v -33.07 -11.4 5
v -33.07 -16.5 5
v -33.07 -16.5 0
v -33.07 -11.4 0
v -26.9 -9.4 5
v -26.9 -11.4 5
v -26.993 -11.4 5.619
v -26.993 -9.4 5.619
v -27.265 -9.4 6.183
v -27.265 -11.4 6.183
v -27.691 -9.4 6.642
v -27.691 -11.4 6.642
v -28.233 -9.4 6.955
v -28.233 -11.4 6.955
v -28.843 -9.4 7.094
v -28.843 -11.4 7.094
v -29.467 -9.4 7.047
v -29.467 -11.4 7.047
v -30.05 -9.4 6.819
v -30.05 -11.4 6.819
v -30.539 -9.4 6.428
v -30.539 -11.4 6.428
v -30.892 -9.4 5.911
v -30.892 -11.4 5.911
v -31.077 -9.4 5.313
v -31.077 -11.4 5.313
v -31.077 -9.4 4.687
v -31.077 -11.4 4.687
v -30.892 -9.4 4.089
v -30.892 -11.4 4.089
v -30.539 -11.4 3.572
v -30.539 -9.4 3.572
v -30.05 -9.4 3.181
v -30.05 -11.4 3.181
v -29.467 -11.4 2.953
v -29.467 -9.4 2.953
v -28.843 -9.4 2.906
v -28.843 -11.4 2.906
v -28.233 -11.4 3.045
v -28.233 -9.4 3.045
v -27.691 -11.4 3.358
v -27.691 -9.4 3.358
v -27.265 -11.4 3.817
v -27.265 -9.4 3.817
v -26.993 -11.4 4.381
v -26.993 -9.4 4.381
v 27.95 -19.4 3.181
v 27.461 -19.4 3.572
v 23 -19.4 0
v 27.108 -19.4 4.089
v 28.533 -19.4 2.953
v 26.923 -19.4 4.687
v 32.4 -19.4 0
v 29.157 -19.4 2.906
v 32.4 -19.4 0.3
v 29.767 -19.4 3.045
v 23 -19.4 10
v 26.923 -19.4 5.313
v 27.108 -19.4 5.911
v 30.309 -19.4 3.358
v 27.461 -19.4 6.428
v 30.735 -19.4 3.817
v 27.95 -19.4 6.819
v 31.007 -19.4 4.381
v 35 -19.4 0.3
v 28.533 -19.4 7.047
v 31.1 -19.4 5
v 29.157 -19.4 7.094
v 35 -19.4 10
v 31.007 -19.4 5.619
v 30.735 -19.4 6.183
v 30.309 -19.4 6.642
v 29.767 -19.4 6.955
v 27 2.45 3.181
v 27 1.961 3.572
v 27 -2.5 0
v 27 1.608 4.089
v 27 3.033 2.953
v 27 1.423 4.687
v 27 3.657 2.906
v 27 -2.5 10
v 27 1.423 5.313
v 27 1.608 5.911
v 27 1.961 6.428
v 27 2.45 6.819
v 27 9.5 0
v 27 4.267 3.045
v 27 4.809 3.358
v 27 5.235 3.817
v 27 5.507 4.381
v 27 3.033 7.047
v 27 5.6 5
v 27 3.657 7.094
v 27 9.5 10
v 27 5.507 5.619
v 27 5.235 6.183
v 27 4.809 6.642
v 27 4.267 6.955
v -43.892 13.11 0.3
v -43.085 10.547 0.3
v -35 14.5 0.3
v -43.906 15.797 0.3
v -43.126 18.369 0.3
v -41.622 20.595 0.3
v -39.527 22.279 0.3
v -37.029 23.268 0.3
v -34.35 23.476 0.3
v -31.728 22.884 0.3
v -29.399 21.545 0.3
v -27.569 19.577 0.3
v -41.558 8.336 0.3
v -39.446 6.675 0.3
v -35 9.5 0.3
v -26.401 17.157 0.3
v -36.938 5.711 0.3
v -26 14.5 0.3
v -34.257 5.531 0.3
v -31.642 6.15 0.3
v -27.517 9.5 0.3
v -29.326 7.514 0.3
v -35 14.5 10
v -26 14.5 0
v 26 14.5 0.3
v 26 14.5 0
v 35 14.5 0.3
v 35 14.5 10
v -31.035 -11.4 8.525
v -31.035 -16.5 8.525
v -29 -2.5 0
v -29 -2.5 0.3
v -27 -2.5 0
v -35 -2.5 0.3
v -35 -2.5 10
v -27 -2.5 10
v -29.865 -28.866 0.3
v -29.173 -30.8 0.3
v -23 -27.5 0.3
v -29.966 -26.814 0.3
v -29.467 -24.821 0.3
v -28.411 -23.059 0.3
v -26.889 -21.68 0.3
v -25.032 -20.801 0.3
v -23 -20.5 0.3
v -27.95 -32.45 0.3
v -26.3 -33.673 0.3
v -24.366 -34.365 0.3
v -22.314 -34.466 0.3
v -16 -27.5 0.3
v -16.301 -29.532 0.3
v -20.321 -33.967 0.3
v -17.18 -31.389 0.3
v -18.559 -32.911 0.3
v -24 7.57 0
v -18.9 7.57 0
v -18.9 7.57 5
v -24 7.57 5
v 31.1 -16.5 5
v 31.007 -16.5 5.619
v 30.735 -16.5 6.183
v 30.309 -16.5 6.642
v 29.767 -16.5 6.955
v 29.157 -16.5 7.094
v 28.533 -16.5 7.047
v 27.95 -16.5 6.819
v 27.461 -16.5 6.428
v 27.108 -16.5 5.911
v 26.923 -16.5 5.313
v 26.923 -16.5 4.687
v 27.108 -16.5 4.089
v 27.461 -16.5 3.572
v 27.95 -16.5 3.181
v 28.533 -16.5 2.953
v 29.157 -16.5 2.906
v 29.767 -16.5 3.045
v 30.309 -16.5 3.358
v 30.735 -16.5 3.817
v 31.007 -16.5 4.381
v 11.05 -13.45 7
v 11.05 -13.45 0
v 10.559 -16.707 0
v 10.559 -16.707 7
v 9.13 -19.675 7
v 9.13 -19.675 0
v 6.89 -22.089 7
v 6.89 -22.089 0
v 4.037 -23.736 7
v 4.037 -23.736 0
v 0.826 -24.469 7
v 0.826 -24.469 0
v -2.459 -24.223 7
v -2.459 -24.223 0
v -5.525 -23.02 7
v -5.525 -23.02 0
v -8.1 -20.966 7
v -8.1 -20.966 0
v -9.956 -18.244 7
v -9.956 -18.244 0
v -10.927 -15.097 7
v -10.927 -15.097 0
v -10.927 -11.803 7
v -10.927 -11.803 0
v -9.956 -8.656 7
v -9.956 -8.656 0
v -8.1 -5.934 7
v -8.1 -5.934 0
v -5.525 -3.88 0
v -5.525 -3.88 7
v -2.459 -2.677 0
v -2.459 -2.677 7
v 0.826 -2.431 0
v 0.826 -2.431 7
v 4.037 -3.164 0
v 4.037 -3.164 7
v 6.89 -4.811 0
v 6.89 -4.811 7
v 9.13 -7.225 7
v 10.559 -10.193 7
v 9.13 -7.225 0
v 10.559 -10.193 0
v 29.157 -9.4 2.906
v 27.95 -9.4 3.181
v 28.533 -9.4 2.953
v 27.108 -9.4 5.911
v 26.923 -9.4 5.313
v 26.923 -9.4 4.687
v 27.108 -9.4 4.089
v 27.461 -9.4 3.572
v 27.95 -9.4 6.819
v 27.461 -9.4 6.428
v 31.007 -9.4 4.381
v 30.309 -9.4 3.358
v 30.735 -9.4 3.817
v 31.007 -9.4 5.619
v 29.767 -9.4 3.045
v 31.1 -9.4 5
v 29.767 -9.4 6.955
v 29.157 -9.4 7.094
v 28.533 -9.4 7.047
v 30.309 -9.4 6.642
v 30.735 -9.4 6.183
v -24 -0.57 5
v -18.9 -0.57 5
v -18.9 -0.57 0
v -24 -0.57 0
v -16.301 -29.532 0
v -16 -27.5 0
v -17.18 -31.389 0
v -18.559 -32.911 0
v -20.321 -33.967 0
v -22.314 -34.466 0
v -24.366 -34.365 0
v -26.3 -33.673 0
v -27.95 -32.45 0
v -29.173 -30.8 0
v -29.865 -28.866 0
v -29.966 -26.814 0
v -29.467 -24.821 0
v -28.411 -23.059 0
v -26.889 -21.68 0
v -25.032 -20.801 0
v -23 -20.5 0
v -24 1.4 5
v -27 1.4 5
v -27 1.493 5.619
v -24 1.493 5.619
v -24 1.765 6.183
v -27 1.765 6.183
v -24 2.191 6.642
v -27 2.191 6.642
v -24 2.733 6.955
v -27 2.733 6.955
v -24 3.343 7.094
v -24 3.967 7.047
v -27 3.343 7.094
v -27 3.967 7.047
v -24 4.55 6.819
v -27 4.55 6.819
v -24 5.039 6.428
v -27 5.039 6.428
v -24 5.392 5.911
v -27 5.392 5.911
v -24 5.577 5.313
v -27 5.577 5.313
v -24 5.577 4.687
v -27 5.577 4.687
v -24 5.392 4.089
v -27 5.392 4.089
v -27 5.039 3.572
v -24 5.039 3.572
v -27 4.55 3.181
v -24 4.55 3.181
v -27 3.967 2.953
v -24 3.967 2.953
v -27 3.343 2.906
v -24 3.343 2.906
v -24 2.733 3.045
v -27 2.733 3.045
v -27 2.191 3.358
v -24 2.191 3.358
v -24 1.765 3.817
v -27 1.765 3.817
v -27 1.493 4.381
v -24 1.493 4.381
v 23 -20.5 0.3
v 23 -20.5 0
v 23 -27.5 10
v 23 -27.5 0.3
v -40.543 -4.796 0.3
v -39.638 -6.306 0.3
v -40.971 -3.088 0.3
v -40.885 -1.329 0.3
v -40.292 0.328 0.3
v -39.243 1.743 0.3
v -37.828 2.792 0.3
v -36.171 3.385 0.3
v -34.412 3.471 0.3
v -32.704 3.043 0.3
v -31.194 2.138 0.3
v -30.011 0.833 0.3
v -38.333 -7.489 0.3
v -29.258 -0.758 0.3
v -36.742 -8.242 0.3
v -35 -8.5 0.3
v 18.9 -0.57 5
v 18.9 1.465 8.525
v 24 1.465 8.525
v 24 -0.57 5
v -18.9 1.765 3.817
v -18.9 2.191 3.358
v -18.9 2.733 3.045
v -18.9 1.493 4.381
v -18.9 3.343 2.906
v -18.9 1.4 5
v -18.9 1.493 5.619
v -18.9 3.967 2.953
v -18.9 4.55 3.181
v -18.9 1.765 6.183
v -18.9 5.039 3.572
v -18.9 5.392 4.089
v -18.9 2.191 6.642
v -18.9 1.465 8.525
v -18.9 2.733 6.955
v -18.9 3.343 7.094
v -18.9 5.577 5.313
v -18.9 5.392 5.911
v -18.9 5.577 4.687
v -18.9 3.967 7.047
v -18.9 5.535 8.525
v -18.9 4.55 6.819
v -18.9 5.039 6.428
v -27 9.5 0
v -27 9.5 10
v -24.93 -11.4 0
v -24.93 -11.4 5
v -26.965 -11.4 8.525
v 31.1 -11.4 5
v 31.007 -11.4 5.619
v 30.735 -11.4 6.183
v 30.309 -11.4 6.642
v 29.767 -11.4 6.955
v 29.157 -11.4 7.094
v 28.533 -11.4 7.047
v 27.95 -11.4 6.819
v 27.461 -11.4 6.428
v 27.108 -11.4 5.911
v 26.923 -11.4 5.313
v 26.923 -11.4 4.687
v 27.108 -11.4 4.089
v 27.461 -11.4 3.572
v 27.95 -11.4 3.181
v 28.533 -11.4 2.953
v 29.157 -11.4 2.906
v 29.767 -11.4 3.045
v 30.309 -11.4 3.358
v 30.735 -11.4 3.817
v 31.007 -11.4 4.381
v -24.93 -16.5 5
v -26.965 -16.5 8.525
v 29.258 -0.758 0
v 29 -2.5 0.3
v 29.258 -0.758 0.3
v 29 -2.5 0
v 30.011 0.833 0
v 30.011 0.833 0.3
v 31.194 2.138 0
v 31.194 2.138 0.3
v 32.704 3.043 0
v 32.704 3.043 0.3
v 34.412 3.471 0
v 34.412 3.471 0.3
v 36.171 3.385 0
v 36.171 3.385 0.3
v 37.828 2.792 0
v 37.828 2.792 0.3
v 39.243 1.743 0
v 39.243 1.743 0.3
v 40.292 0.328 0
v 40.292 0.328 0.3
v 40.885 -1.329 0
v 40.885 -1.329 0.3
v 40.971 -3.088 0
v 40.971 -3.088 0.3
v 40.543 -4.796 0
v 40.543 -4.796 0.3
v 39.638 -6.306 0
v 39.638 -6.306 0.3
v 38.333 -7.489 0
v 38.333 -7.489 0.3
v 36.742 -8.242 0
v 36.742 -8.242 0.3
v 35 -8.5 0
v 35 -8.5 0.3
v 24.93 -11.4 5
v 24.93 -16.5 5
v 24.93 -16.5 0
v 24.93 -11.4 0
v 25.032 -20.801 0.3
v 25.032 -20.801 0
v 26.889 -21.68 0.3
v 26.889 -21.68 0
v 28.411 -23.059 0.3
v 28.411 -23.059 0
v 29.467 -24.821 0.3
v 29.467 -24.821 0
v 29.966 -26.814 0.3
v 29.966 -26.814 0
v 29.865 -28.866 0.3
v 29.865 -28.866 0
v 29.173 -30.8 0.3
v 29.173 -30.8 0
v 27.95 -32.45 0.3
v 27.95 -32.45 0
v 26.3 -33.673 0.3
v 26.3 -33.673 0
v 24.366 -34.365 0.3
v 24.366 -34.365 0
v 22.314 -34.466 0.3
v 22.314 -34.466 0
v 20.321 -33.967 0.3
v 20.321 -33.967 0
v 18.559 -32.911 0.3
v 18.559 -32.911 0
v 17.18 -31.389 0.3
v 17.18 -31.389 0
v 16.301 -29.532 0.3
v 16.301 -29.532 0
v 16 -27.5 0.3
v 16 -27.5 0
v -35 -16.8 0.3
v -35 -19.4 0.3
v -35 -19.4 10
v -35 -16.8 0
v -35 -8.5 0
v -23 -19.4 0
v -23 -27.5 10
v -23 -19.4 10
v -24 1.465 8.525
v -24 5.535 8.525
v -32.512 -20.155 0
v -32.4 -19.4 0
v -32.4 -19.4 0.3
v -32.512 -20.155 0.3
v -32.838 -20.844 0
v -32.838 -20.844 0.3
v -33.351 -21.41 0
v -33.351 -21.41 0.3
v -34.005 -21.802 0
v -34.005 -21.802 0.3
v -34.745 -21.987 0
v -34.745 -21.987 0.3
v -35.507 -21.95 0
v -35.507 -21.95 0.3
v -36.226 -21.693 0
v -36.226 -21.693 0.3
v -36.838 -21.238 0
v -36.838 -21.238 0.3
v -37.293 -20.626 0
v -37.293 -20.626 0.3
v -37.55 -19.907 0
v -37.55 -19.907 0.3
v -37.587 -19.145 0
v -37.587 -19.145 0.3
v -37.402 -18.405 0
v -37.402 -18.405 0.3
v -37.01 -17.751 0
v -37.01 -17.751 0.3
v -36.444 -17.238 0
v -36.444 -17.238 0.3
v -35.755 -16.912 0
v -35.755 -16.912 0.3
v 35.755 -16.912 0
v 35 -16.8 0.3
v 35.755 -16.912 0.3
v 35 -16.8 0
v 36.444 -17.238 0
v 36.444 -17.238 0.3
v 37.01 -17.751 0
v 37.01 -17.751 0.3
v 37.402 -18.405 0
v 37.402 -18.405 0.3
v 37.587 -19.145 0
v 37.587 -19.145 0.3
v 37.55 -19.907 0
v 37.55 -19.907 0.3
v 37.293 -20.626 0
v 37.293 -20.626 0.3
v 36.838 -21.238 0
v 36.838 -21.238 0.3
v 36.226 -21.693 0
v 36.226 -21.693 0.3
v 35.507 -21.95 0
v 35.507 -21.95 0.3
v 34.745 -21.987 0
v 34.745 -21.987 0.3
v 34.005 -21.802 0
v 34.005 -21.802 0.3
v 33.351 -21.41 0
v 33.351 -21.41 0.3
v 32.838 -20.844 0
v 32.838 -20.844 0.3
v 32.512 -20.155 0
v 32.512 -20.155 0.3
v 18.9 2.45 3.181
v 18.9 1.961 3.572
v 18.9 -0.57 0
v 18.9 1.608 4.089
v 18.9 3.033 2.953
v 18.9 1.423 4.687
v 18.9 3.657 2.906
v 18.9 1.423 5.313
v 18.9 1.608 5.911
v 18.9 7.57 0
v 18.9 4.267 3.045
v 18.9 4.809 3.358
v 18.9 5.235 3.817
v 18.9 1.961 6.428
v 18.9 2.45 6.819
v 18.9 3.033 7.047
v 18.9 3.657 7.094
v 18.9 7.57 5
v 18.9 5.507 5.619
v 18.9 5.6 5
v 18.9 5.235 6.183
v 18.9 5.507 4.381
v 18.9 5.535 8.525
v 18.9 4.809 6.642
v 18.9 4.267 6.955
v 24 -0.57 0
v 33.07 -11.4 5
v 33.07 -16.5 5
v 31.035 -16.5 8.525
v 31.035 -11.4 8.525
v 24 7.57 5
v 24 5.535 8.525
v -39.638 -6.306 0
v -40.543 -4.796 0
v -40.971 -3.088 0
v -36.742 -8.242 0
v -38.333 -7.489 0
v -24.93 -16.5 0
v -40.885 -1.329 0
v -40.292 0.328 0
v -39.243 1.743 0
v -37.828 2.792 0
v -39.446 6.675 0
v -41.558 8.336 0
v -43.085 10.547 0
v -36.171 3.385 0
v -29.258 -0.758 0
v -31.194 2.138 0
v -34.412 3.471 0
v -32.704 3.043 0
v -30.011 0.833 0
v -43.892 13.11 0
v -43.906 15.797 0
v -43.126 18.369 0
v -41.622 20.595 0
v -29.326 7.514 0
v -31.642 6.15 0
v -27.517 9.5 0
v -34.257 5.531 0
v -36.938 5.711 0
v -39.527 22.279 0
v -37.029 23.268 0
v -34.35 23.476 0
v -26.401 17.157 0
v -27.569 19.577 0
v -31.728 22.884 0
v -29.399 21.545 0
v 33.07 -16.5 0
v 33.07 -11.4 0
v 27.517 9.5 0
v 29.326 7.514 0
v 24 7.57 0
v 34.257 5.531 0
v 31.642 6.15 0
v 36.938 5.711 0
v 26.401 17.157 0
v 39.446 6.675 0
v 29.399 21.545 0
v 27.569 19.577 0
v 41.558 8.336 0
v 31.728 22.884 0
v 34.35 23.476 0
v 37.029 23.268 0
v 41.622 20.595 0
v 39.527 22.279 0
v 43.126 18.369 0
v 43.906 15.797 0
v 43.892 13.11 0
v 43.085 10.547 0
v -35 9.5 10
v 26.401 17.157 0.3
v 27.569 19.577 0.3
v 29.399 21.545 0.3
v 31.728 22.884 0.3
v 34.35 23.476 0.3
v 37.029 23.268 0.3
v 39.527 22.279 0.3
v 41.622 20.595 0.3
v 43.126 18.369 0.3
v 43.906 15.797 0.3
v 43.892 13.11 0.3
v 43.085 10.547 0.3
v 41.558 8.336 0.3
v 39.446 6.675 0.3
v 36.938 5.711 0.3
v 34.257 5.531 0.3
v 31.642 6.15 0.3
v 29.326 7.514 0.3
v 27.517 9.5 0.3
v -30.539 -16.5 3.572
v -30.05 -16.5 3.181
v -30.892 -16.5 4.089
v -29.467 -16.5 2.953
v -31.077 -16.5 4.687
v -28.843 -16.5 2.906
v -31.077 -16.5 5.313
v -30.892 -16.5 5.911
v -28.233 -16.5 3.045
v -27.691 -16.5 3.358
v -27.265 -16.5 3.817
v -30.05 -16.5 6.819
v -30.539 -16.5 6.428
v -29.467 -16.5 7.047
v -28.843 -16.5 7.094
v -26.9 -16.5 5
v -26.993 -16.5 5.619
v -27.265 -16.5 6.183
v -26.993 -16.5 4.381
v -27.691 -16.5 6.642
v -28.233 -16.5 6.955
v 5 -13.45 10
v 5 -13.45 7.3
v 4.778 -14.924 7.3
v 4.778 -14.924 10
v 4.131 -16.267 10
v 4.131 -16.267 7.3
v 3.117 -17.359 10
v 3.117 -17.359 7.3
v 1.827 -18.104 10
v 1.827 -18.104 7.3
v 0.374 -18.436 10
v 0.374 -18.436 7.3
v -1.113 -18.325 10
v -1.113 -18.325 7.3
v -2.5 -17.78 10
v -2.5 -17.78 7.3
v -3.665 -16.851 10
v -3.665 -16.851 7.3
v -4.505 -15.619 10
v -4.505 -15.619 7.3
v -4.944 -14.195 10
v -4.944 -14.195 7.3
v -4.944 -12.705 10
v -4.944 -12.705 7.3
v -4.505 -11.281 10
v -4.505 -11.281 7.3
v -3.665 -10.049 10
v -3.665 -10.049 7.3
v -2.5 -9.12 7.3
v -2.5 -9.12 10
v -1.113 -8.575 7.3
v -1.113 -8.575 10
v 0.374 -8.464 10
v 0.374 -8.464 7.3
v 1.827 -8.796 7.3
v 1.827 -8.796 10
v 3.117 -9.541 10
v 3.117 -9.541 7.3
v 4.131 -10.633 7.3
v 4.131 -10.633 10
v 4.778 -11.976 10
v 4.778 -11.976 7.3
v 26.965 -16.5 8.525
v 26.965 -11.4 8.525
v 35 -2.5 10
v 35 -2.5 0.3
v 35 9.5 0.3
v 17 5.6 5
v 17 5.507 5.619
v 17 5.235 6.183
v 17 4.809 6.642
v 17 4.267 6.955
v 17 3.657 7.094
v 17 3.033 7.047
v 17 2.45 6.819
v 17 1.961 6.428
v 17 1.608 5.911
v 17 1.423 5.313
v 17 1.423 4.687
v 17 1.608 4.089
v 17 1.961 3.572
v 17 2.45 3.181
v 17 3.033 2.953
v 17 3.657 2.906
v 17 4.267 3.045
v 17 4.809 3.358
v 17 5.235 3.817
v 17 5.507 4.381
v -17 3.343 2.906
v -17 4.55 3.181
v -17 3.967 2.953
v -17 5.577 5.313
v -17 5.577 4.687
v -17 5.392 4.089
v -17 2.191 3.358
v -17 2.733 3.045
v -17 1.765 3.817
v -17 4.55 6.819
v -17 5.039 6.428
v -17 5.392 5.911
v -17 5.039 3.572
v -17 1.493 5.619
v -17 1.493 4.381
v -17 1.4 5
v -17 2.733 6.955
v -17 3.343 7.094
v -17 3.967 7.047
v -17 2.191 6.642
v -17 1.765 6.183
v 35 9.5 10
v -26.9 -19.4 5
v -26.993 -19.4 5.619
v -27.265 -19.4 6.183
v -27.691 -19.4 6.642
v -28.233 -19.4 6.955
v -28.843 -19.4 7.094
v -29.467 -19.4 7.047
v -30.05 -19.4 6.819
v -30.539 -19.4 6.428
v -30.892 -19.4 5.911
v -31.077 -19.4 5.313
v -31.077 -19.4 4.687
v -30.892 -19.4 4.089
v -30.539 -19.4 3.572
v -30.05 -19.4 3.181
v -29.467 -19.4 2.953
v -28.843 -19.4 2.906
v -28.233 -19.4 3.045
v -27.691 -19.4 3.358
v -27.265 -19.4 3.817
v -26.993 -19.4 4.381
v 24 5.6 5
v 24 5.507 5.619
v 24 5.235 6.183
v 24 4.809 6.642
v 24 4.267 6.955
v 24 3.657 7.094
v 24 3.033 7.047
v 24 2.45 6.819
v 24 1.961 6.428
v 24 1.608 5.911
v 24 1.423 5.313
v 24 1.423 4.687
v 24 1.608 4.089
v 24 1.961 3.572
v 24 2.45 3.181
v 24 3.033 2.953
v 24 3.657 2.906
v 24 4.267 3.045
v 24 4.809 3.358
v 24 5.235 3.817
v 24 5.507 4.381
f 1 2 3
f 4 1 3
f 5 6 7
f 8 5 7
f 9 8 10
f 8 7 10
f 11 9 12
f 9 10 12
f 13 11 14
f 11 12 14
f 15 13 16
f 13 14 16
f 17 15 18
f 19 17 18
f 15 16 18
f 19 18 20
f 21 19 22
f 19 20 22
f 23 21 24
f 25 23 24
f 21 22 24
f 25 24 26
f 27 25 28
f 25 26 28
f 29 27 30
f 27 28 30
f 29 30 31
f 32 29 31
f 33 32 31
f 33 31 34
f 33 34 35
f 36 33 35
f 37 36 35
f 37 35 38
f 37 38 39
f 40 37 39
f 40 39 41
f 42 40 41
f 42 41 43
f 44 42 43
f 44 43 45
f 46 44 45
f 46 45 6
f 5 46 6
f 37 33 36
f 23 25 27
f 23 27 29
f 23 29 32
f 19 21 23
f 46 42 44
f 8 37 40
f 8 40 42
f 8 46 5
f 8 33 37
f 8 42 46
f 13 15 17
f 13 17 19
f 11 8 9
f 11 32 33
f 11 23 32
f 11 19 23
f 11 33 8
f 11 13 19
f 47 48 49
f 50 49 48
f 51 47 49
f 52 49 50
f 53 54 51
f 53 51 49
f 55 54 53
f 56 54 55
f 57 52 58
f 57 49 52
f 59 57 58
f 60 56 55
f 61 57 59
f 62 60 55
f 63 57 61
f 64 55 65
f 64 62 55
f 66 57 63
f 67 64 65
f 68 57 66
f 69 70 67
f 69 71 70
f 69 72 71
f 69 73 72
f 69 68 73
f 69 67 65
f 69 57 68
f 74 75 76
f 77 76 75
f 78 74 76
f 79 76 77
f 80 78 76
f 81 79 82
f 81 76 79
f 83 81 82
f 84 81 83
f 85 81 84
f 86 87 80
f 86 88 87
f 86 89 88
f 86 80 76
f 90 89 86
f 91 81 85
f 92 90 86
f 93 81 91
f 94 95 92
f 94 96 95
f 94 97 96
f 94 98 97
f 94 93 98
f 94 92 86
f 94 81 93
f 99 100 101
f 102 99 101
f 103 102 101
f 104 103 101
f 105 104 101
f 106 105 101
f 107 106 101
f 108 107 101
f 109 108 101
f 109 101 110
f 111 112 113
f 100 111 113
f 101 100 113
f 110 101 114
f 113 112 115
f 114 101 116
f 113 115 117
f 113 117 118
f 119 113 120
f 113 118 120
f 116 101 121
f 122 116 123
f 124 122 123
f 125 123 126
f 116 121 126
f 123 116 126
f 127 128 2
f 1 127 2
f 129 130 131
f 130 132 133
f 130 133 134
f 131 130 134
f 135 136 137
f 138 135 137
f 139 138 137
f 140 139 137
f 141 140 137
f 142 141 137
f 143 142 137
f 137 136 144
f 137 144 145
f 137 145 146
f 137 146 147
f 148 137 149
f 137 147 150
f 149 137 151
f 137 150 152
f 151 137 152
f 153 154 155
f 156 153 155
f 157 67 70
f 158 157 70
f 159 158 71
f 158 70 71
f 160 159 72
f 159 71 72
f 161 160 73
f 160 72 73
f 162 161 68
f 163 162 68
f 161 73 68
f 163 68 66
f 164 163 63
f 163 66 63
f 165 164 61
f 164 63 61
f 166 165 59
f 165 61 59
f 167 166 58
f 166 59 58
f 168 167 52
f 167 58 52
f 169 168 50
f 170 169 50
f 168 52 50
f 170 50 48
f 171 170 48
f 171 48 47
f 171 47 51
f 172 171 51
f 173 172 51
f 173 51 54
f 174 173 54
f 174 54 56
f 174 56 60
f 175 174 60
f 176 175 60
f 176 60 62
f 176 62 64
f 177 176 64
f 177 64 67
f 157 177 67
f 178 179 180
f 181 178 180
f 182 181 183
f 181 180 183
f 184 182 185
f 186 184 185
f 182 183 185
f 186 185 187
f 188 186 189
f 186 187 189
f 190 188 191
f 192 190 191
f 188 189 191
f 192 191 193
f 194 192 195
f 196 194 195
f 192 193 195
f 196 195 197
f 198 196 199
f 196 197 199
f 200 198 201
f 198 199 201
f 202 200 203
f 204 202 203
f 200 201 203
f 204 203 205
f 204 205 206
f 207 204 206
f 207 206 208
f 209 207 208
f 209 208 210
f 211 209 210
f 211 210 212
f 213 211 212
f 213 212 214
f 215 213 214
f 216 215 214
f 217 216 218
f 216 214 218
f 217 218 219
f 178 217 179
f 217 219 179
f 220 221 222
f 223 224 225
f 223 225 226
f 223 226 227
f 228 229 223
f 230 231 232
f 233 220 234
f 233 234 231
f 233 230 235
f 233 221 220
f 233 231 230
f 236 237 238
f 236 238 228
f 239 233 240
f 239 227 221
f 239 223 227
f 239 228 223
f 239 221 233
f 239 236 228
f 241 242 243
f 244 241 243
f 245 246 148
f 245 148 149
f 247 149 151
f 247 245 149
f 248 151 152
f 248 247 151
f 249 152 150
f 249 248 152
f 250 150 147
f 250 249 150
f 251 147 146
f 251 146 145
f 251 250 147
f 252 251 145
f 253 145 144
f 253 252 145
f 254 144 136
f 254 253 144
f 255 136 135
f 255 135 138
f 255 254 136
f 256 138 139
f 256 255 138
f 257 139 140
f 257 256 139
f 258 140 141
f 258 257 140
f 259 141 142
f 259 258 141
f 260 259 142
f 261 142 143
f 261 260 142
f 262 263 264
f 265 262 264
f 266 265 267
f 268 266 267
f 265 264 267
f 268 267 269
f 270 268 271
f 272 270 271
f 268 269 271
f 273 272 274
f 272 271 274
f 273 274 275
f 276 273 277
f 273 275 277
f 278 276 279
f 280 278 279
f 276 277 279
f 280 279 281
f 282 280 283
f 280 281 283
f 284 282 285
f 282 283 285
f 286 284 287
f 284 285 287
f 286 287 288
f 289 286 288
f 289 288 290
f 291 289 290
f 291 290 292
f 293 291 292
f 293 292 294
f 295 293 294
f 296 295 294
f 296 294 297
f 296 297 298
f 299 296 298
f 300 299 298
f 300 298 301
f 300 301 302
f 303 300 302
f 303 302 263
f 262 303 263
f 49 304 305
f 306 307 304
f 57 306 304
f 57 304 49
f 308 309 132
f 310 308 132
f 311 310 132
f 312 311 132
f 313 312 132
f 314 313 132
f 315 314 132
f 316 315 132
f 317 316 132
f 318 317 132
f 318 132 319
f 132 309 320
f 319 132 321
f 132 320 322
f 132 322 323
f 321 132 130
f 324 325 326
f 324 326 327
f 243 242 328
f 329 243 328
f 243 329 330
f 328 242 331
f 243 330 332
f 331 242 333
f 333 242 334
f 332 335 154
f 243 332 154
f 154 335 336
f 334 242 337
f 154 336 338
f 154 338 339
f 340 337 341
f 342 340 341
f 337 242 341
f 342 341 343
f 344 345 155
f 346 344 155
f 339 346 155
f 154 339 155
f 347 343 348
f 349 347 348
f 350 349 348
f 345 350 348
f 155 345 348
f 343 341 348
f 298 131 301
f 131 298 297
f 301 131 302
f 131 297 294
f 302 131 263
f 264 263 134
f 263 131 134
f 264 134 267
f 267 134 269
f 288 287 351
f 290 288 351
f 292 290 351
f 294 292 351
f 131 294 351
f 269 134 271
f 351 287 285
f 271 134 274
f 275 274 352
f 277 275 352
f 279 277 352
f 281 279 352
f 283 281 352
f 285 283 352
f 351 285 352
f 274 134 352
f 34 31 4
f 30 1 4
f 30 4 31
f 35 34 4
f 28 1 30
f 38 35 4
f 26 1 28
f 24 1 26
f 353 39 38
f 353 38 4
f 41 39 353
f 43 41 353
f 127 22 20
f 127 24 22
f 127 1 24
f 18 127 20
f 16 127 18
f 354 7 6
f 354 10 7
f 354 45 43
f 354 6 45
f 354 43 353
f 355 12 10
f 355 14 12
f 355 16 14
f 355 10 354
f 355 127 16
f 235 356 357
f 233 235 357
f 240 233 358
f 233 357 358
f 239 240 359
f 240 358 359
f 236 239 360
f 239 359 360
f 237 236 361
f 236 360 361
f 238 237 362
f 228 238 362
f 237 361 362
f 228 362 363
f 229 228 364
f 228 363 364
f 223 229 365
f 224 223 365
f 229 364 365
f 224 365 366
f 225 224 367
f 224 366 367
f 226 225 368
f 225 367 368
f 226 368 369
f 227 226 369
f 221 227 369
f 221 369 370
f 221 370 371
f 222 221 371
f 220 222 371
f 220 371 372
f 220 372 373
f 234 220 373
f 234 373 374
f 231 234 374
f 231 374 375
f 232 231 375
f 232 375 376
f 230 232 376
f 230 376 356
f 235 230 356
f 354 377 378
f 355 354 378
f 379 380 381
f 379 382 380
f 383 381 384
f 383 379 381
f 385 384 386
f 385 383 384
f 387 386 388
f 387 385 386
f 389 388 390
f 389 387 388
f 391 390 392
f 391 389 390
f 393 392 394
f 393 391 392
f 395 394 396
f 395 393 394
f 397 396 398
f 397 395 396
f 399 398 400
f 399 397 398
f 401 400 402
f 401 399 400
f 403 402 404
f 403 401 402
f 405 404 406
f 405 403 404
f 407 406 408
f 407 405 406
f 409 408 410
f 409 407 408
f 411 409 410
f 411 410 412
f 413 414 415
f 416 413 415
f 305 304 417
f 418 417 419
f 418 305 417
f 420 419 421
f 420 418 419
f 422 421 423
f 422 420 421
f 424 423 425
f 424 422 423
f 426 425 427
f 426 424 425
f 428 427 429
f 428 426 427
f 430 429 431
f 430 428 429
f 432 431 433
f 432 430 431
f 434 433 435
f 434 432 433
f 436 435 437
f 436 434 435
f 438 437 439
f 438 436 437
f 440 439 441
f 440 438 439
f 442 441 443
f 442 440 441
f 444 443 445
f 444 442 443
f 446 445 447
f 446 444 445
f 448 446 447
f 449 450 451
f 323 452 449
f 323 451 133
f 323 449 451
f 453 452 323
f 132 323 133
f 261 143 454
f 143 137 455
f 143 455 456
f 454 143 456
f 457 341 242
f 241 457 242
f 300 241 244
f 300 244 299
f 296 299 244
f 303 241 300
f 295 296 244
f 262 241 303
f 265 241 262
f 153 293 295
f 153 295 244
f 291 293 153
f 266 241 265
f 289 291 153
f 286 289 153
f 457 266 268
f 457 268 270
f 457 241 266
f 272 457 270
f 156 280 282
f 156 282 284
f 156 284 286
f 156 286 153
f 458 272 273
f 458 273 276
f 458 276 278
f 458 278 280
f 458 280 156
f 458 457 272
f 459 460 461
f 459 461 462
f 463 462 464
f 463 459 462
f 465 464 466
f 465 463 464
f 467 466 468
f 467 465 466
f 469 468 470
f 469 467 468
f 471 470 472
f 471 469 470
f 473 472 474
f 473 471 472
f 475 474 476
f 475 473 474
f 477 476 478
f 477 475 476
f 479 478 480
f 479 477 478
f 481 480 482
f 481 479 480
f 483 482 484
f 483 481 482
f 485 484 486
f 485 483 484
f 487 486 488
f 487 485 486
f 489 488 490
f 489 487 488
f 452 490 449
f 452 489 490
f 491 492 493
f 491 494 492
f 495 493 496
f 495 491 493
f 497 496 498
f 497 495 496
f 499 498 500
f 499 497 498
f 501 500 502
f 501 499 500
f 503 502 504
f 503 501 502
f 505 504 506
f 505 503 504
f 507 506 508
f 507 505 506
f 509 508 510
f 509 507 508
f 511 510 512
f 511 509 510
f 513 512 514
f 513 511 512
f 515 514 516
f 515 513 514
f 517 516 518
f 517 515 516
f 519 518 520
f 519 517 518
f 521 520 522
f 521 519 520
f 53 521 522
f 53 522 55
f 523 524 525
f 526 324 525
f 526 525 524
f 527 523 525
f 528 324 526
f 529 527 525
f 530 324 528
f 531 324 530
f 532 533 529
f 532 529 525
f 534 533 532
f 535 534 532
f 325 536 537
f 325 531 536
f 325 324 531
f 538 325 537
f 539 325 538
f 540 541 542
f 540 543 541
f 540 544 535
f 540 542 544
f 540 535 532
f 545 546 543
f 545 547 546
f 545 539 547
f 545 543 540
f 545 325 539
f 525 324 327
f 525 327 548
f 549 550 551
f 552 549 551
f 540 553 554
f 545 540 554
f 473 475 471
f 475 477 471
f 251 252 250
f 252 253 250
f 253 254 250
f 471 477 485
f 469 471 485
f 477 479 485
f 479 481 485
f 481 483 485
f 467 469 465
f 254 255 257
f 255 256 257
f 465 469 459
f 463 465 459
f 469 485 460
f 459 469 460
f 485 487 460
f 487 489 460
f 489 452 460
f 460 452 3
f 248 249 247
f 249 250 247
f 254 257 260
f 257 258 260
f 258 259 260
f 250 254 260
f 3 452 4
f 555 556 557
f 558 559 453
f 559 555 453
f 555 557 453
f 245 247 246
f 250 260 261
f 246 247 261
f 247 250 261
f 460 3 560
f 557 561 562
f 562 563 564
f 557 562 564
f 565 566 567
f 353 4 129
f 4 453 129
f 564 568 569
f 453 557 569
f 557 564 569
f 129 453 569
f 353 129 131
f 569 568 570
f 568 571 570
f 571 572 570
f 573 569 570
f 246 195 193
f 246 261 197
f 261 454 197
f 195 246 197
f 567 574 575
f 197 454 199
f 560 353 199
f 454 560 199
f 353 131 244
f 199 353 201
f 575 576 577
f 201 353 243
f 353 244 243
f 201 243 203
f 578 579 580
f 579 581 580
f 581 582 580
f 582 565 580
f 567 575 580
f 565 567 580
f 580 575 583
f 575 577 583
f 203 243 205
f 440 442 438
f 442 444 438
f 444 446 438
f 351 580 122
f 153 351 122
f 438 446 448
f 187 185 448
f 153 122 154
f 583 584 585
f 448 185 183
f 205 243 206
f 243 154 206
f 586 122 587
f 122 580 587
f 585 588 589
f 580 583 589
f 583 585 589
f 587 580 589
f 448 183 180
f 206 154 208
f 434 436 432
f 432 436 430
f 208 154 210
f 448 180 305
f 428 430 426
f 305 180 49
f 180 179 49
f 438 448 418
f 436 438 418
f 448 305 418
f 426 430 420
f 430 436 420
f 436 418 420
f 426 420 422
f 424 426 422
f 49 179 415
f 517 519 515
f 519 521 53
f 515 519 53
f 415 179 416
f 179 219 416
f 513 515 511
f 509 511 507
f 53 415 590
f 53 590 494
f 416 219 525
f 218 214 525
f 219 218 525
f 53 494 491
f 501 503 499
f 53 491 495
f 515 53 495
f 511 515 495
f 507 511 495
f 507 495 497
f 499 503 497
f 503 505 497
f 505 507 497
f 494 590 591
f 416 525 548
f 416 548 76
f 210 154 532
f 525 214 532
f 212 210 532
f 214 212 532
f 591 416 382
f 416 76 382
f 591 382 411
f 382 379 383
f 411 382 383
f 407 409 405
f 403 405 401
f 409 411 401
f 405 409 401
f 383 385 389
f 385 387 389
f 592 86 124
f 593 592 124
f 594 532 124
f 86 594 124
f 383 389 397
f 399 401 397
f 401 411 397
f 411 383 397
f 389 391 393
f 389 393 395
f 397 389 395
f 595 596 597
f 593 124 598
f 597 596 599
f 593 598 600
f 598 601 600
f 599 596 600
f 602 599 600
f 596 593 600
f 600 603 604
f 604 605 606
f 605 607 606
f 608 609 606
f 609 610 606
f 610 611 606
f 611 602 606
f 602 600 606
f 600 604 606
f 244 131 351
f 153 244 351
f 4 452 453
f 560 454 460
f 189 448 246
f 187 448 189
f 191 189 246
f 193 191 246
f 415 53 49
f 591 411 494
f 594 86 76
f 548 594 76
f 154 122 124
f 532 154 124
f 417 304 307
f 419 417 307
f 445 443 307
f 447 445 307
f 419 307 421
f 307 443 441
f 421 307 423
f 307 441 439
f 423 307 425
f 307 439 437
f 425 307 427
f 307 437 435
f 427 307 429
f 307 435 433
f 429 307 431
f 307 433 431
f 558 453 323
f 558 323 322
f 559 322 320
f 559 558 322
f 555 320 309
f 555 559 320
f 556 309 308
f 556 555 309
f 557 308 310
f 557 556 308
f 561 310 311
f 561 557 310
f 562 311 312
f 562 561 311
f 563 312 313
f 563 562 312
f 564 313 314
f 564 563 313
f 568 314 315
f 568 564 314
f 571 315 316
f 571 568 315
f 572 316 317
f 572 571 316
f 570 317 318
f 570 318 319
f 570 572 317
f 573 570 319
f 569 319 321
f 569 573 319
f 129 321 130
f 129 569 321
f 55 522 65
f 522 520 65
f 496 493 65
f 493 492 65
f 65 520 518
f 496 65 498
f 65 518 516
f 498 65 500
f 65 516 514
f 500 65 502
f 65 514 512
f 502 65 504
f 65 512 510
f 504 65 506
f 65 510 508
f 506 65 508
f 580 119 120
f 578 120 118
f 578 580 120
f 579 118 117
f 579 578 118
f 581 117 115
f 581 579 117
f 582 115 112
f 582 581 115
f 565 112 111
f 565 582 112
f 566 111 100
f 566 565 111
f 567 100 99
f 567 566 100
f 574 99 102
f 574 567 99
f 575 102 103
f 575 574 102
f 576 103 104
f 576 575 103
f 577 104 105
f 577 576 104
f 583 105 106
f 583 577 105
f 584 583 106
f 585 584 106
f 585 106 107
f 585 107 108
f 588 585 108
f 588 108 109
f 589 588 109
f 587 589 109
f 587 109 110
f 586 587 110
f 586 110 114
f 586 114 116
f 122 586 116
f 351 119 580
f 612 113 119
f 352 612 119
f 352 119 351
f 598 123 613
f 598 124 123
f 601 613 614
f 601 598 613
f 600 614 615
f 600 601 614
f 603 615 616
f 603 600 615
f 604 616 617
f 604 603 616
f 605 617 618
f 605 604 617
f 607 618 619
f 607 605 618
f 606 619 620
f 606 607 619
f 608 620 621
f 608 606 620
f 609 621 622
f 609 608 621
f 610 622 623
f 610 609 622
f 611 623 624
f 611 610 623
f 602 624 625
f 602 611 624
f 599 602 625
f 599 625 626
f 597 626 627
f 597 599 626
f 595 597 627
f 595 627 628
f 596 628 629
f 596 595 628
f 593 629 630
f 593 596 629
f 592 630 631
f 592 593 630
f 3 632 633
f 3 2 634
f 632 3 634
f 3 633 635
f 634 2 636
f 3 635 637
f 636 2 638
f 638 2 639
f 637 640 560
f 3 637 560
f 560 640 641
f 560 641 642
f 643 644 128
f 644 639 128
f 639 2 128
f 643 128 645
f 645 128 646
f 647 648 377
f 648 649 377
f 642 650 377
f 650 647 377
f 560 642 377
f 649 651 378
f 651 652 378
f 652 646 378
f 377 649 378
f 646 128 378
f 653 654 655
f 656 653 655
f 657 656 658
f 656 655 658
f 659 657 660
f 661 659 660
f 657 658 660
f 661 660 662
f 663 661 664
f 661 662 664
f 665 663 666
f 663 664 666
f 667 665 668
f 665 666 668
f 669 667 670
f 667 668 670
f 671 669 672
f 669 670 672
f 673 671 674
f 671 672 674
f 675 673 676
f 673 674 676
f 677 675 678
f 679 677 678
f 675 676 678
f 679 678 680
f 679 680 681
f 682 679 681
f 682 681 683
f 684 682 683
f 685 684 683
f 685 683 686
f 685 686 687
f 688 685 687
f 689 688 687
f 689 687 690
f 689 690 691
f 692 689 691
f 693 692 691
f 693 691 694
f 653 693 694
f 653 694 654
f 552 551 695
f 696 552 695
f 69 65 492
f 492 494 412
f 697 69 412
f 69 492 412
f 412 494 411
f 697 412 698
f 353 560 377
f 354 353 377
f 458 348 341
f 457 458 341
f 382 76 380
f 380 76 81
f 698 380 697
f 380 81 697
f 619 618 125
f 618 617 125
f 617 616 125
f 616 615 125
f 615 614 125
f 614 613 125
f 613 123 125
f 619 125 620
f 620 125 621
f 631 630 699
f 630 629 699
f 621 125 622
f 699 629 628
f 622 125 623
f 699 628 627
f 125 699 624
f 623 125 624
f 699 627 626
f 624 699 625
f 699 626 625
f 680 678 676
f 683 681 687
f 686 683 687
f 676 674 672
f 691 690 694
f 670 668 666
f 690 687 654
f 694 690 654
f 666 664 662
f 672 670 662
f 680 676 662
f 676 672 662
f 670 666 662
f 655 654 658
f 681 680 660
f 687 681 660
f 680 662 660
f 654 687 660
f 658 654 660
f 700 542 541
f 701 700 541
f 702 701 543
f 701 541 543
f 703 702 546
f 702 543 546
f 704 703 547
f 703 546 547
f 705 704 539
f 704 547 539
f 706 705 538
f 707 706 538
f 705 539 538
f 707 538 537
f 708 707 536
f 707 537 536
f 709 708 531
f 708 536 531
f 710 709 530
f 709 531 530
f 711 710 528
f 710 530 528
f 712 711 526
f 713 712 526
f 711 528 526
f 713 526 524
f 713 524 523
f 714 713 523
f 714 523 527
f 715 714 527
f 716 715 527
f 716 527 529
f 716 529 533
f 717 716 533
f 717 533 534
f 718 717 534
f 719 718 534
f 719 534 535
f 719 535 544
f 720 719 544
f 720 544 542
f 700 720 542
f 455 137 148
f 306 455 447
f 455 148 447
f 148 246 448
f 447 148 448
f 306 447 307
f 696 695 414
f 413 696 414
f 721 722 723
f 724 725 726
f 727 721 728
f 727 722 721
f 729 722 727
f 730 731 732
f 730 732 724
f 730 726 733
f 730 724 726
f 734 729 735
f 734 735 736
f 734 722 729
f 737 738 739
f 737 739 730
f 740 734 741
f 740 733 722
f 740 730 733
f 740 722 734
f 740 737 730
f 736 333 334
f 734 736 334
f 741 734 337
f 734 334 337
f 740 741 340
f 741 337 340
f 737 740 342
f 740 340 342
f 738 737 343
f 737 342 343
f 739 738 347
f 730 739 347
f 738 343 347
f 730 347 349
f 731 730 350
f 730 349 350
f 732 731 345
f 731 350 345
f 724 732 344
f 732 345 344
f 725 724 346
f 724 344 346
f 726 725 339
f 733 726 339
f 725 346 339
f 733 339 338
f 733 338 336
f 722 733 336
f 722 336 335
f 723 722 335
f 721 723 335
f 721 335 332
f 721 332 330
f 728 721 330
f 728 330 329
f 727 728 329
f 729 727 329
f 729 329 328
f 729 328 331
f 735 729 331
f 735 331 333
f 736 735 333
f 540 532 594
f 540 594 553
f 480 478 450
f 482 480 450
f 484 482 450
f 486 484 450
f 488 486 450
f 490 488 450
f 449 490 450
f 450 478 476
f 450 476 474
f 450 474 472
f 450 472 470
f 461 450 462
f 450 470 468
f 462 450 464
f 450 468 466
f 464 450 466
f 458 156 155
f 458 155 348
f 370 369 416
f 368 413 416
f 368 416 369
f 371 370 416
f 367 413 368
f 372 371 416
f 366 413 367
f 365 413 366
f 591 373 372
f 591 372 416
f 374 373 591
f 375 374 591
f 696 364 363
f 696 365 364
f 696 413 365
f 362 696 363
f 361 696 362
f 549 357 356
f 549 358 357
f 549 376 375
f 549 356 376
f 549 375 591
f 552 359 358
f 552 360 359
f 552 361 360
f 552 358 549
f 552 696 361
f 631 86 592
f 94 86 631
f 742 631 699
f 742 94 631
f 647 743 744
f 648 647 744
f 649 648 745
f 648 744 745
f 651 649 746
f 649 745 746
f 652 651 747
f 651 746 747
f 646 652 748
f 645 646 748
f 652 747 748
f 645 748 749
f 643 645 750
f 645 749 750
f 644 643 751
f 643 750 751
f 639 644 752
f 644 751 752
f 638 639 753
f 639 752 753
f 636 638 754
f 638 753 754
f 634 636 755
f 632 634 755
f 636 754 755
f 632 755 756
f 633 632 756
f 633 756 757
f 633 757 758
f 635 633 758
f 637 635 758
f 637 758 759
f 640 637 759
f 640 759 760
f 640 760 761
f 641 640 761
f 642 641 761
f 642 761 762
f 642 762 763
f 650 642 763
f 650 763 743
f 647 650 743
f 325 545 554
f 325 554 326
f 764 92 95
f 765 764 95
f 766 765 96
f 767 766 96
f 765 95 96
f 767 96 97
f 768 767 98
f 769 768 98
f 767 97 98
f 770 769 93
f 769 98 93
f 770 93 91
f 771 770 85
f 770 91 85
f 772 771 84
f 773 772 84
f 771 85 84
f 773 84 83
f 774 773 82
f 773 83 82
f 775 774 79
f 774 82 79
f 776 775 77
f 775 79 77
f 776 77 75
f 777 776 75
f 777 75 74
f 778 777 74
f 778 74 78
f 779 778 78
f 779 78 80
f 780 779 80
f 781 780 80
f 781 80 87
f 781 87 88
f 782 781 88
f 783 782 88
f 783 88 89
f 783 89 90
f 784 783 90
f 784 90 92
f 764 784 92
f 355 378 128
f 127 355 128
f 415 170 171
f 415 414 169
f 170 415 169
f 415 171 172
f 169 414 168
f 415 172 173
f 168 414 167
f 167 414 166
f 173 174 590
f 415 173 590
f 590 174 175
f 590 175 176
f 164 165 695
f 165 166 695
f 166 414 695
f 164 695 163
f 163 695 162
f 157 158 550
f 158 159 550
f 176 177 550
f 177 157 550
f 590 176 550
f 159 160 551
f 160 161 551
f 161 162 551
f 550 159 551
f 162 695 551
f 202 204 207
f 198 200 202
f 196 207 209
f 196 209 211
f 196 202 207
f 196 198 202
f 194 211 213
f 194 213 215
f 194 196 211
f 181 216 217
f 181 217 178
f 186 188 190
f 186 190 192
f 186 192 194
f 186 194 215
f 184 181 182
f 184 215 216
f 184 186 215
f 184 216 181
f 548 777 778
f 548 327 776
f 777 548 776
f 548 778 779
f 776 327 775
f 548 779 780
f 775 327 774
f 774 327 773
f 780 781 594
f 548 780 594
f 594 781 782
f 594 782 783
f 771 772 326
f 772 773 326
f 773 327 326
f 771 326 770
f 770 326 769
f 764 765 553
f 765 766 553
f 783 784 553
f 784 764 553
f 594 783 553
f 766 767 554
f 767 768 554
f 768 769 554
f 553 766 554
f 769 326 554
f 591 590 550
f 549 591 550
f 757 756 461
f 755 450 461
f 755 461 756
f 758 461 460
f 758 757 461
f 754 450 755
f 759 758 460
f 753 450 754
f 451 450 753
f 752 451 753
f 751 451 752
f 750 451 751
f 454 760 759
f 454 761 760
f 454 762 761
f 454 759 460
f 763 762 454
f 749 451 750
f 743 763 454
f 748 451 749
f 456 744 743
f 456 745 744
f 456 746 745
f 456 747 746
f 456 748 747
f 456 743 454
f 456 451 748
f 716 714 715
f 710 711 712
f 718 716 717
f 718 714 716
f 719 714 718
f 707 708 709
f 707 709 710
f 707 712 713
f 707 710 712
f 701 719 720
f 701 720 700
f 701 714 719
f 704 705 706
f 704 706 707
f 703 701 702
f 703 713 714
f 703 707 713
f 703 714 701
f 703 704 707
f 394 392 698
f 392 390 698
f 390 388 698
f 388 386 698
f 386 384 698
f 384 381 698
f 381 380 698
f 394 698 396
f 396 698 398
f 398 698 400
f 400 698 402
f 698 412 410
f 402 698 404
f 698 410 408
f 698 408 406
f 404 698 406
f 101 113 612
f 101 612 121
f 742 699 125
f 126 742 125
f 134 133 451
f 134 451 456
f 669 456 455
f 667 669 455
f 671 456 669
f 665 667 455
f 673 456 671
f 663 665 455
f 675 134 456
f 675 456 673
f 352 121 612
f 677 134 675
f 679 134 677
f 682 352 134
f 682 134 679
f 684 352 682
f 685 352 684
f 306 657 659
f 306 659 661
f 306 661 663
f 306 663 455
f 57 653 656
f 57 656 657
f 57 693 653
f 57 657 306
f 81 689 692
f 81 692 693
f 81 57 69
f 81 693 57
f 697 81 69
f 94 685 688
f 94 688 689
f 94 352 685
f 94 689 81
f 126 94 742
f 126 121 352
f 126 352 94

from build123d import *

# Parameters (mm, degrees)
PAD002_DEPTH    = 5.1
PAD003_DEPTH    = 5.1
PAD001_DEPTH    = 5.1
SKETCH_W        = 70
SKETCH_H        = 55
PAD_DEPTH       = 10
SKETCH001_R     = 11.05
POCKET_DEPTH    = 7
SKETCH002_R     = 5
POCKET001_DEPTH = 3.001
SKETCH003_W     = 12
SKETCH003_H     = 8.1
SKETCH003_W_2   = 8
SKETCH003_H_2   = 12
POCKET002_DEPTH = 10.001
SKETCH004_R     = 2.1
POCKET003_DEPTH = 10
SKETCH005_R     = 2.1
POCKET004_DEPTH = 10
SKETCH006_R     = 2.1
POCKET005_DEPTH = 10
SKETCH010_W     = 70
SKETCH010_H     = 13
POCKET006_DEPTH = 10.001
SKETCH011_R     = 9
SKETCH011_R_2   = 6
SKETCH011_R_3   = 7
SKETCH011_R_4   = 2.6
PAD004_DEPTH    = 0.3
SKETCH012_R     = 5
PAD005_DEPTH    = 0.3


with BuildPart() as pad002:
    # Sketch008 → Pad002 (new body)
    with BuildSketch(Plane.YZ.offset(24)):
        Polygon((7.570319, 5), (5.53516, 8.525), (1.46484, 8.525), (-0.570319, 5), (-0.570319, 0), (7.570319, 0), align=None)
    extrude(amount=-PAD002_DEPTH)


with BuildPart() as pad003:
    # Sketch009 → Pad003 (new body)
    with BuildSketch(Plane.XZ.offset(16.5)):
        Polygon((-24.929681, 5), (-26.96484, 8.525), (-31.03516, 8.525), (-33.070319, 5), (-33.070319, 0), (-24.929681, 0), align=None)
        Polygon((33.070319, 5), (31.03516, 8.525), (26.96484, 8.525), (24.929681, 5), (24.929681, 0), (33.070319, 0), align=None)
    extrude(amount=-PAD003_DEPTH)


with BuildPart() as pad001:
    # Sketch007 → Pad001 (new body)
    with BuildSketch(Plane.YZ.offset(-24)):
        Polygon((7.570319, 5), (5.53516, 8.525), (1.46484, 8.525), (-0.570319, 5), (-0.570319, 0), (7.570319, 0), align=None)
    extrude(amount=PAD001_DEPTH)


with BuildPart() as halterung_fr_sspindel_bot_druck:
    # Sketch → Pad (new body)
    with BuildSketch(Plane.XY):
        Rectangle(SKETCH_W, SKETCH_H)
    extrude(amount=PAD_DEPTH)

    # Sketch001 → Pocket (cut)
    with BuildSketch(Plane(origin=(0, 0, 0), x_dir=(1, 0, 0), z_dir=(0, 0, -1))):
        with Locations((0, 13.45)):
            Circle(SKETCH001_R)
    extrude(amount=-POCKET_DEPTH, mode=Mode.SUBTRACT)

    # Sketch002 → Pocket001 (cut, through all)
    with BuildSketch(Plane(origin=(0, 0, 7), x_dir=(1, 0, 0), z_dir=(0, 0, -1))):
        with Locations((0, 13.45)):
            Circle(SKETCH002_R)
    extrude(amount=-POCKET001_DEPTH, mode=Mode.SUBTRACT)

    # Sketch003 → Pocket002 (cut, through all)
    with BuildSketch(Plane.XY.offset(10)):
        with Locations((-29, -23.45)):
            Rectangle(SKETCH003_W, SKETCH003_H)
        with Locations((29, -23.45)):
            Rectangle(SKETCH003_W, SKETCH003_H)
        with Locations((-31, 3.5)):
            Rectangle(SKETCH003_W_2, SKETCH003_H_2)
        with Locations((31, 3.5)):
            Rectangle(SKETCH003_W_2, SKETCH003_H_2)
    extrude(amount=-POCKET002_DEPTH, mode=Mode.SUBTRACT)

    # Sketch004 → Pocket003 (cut)
    with BuildSketch(Plane(origin=(-27, 0, 0), x_dir=(0, -1, 0), z_dir=(-1, 0, 0))):
        with Locations((-3.5, 5)):
            Circle(SKETCH004_R)
    extrude(amount=-POCKET003_DEPTH, mode=Mode.SUBTRACT)

    # Sketch005 → Pocket004 (cut)
    with BuildSketch(Plane.YZ.offset(27)):
        with Locations((3.5, 5)):
            Circle(SKETCH005_R)
    extrude(amount=-POCKET004_DEPTH, mode=Mode.SUBTRACT)

    # Sketch006 → Pocket005 (cut)
    with BuildSketch(Plane.XZ.offset(19.4)):
        with Locations((-29, 5)):
            Circle(SKETCH006_R)
        with Locations((29, 5)):
            Circle(SKETCH006_R)
    extrude(amount=-POCKET005_DEPTH, mode=Mode.SUBTRACT)

    # Cut: cut Pad001
    add(pad001.part, mode=Mode.SUBTRACT)

    # Cut001: cut Pad003
    add(pad003.part, mode=Mode.SUBTRACT)

    # Cut002: cut Pad002
    add(pad002.part, mode=Mode.SUBTRACT)

    # Sketch010 → Pocket006 (cut, through all)
    with BuildSketch(Plane.XY.offset(10)):
        with Locations((0, 21)):
            Rectangle(SKETCH010_W, SKETCH010_H)
    extrude(amount=-POCKET006_DEPTH, mode=Mode.SUBTRACT)

    # Sketch011 → Pad004 (new body)
    with BuildSketch(Plane(origin=(0, 0, 0), x_dir=(1, 0, 0), z_dir=(0, 0, -1))):
        with Locations((-35, -14.5)):
            Circle(SKETCH011_R)
        with Locations((-35, 2.5)):
            Circle(SKETCH011_R_2)
        with Locations((-23, 27.5)):
            Circle(SKETCH011_R_3)
        with Locations((-35, 19.4)):
            Circle(SKETCH011_R_4)
        with Locations((35, 19.4)):
            Circle(SKETCH011_R_4)
        with Locations((23, 27.5)):
            Circle(SKETCH011_R_3)
        with Locations((35, 2.5)):
            Circle(SKETCH011_R_2)
        with Locations((35, -14.5)):
            Circle(SKETCH011_R)
    extrude(amount=-PAD004_DEPTH)

    # Sketch012 → Pad005 (new body)
    with BuildSketch(Plane(origin=(0, 0, 7), x_dir=(1, 0, 0), z_dir=(0, 0, -1))):
        with Locations((0, 13.45)):
            Circle(SKETCH012_R)
    extrude(amount=-PAD005_DEPTH)


solid = halterung_fr_sspindel_bot_druck.part
